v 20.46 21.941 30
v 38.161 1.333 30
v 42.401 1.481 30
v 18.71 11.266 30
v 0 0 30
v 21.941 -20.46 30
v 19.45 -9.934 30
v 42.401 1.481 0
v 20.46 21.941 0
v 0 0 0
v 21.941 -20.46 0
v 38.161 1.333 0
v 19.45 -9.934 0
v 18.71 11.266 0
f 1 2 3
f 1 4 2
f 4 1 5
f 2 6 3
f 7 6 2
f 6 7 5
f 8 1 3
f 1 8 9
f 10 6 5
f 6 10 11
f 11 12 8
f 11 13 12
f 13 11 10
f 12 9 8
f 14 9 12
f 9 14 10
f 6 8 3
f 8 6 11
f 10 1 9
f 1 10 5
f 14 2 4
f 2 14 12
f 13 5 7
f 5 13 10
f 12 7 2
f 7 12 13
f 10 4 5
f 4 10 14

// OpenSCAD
rotate([0,0,-88])
rotate([0,-90,0]){
    difference(){
        rotate([-45,0,0]) {
            cube([30, 30, 30]);
        }
        scale([1,0.9,0.5]) {
            rotate([-45,0,0]) {
                cube([30, 30, 30]);
            }
        }
    }
}
